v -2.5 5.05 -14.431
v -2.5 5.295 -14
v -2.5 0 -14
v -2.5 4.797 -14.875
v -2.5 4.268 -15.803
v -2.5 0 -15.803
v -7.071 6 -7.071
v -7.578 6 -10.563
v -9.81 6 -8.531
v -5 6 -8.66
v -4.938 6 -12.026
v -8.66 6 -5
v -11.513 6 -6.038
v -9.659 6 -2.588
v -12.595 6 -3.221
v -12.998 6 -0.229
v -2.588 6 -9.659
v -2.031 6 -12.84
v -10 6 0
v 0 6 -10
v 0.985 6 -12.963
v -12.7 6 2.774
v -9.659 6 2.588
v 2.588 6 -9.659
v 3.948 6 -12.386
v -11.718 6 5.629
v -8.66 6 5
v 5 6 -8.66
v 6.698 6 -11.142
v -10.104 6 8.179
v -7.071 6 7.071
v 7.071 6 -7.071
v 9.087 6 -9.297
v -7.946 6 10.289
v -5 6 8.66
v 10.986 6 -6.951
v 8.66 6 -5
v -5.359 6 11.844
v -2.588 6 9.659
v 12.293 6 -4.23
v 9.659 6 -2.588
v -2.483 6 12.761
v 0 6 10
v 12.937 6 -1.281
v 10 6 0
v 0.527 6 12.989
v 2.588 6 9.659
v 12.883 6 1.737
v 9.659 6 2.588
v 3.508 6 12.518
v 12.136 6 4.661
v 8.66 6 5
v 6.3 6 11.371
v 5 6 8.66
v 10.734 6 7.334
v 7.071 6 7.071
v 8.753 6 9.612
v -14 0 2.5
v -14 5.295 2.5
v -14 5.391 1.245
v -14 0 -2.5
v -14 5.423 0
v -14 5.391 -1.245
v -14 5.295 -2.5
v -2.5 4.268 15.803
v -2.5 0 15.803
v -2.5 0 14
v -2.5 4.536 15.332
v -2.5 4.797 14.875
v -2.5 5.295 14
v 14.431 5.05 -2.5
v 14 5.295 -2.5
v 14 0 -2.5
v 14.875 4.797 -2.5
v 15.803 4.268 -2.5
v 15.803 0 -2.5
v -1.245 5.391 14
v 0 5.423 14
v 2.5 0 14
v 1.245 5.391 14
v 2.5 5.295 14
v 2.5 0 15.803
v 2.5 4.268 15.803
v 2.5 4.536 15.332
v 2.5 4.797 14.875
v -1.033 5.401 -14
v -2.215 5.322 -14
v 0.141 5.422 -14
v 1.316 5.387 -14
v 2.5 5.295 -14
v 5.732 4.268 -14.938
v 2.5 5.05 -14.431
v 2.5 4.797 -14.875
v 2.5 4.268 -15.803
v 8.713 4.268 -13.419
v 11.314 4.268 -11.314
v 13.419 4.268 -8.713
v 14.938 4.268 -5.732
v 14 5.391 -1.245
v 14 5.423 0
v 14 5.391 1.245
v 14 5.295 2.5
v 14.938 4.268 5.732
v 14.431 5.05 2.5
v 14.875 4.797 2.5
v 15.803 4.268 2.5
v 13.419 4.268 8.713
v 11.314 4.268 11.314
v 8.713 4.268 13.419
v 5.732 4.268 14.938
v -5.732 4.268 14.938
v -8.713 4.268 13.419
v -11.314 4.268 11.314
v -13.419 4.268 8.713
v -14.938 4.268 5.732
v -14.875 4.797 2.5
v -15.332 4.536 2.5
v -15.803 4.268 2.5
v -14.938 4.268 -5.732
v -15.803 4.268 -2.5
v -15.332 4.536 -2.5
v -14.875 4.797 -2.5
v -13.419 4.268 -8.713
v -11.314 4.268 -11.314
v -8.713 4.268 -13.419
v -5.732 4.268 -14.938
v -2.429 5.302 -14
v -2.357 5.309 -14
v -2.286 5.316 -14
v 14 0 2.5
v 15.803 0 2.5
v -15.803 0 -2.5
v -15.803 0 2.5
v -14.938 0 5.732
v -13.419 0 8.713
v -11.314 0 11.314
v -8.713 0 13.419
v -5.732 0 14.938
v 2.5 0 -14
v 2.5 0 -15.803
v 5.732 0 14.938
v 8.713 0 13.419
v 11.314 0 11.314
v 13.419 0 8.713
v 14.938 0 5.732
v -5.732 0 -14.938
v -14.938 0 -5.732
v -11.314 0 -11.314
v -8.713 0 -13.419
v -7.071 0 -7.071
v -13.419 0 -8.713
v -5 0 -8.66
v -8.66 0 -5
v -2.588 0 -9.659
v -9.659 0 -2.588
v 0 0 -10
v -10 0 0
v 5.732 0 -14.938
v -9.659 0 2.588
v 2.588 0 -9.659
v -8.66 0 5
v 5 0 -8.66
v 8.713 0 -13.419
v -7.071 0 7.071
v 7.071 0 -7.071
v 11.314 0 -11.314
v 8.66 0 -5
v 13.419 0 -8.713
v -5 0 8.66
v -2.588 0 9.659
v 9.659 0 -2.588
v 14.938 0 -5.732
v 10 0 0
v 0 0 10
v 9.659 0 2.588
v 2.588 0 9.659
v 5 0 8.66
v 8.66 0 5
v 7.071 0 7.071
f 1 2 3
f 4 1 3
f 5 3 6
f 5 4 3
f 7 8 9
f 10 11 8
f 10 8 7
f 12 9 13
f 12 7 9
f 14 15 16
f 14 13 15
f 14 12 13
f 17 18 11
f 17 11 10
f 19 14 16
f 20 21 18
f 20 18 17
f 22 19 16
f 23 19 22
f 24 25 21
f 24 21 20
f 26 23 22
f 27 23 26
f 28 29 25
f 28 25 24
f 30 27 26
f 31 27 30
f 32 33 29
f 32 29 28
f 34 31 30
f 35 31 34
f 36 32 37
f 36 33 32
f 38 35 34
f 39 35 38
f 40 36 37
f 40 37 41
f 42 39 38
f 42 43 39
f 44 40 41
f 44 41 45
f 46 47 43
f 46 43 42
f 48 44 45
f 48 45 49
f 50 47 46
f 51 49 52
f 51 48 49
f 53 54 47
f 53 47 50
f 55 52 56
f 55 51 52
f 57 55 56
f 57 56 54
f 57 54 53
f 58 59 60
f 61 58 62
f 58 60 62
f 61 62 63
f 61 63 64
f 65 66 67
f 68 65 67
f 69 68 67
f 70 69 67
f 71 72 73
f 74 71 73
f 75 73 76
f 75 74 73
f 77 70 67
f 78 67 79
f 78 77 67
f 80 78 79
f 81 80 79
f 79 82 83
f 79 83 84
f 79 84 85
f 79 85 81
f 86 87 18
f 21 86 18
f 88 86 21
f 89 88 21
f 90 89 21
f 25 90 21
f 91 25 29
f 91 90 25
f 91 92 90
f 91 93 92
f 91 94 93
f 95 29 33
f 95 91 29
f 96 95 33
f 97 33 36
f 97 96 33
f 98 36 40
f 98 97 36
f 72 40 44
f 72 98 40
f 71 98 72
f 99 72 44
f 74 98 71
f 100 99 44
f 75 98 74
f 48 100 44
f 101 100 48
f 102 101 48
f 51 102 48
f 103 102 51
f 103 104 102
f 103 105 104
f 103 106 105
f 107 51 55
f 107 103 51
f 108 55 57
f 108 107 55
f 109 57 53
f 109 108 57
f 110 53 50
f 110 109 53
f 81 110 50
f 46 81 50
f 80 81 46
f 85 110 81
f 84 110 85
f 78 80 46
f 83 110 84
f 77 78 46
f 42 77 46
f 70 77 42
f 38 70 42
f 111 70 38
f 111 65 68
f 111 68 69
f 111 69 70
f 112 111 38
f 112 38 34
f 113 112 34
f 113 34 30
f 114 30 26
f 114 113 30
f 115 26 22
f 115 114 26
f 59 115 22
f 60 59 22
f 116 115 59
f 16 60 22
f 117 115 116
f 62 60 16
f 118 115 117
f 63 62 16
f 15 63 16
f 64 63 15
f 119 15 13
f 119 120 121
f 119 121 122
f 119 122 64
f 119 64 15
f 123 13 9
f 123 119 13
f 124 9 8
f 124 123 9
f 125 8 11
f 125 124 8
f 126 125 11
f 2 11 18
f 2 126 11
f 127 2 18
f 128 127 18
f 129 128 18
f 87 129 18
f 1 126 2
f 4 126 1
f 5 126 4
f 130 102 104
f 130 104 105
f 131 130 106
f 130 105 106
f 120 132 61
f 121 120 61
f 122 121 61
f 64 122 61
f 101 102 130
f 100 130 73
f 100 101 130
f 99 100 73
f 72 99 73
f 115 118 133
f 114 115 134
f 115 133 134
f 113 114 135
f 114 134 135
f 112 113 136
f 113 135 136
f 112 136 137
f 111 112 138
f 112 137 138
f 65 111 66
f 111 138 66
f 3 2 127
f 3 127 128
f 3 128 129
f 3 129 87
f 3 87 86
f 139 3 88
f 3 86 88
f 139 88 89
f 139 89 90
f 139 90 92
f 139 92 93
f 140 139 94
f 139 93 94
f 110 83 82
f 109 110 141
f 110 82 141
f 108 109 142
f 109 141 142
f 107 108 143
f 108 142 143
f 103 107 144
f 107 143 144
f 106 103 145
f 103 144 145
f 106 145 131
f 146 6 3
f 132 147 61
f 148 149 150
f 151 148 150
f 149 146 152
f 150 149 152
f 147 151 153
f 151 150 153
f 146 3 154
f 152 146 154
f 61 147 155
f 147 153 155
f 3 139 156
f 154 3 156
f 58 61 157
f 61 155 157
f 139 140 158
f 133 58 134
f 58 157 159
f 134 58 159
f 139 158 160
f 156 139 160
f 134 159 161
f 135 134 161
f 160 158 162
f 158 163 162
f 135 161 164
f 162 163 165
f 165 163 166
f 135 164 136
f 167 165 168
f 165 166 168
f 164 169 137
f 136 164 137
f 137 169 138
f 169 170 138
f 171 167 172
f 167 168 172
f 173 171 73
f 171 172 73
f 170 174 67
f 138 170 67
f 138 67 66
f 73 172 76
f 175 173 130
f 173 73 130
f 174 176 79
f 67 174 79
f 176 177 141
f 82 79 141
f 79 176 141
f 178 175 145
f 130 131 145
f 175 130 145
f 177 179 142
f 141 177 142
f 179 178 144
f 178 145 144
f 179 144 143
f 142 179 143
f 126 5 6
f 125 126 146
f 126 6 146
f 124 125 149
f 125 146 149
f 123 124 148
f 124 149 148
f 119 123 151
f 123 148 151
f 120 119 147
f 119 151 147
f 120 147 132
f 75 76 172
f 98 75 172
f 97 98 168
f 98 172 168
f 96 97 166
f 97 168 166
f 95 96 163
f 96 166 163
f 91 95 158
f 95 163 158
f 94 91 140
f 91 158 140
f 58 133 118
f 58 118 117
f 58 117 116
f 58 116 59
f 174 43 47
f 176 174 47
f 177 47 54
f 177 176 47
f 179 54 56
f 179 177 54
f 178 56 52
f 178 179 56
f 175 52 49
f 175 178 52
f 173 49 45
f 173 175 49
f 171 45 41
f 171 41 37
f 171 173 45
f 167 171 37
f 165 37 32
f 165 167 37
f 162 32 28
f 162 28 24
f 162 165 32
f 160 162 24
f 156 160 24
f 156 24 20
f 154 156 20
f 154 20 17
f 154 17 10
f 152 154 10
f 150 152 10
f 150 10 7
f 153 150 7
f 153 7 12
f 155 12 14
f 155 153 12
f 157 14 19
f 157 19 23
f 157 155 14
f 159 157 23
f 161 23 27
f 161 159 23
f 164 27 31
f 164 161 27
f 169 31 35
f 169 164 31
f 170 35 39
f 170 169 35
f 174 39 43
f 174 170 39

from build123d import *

# Parameters (mm, degrees)
CROQUIS1_R              = 16
CROQUIS1_R_2            = 10
SALIENTE_EXTRUIR1_DEPTH = 6
CROQUIS2_W              = 5
CROQUIS2_H              = 2
CROQUIS2_W_2            = 2
CROQUIS2_H_2            = 5
CORTAR_EXTRUIR1_DEPTH   = 6


with BuildPart() as part:
    # Croquis1 → Saliente-Extruir1 (new body)
    with BuildSketch(Plane(origin=(0, 0, 0), x_dir=(1, 0, 0), z_dir=(0, 1, 0))):
        with Locations(Location((0, 0, 0), (0, 0, 270))):
            Circle(CROQUIS1_R)
        with Locations(Location((0, 0, 0), (0, 0, 270))):
            Circle(CROQUIS1_R_2, mode=Mode.SUBTRACT)
    extrude(amount=SALIENTE_EXTRUIR1_DEPTH)

    # Croquis2 → Cortar-Extruir1 (cut)
    with BuildSketch(Plane(origin=(0, 6, 0), x_dir=(1, 0, 0), z_dir=(0, 1, 0))):
        with Locations((0, 15)):
            Rectangle(CROQUIS2_W, CROQUIS2_H)
        with Locations((0, -15)):
            Rectangle(CROQUIS2_W, CROQUIS2_H)
        with Locations((15, 0)):
            Rectangle(CROQUIS2_W_2, CROQUIS2_H_2)
        with Locations((-15, 0)):
            Rectangle(CROQUIS2_W_2, CROQUIS2_H_2)
    extrude(amount=-CORTAR_EXTRUIR1_DEPTH, mode=Mode.SUBTRACT)

    # Croquis3 → Cortar-Revolución1 (revolve, cut)
    with BuildSketch(Plane(origin=(0, 0, 0), x_dir=(0, 0, -1), z_dir=(1, 0, 0)), mode=Mode.PRIVATE) as cortar_revoluci_n1_sk:
        Polygon((-16, 6), (-13, 6), (-16, 4.267949192), align=None)
    revolve(cortar_revoluci_n1_sk.sketch.rotate(Axis((0, 6, 0), (0, -1, 0)), 171.010700805), axis=Axis((0, 6, 0), (0, -1, 0)), mode=Mode.SUBTRACT)


solid = part.part
